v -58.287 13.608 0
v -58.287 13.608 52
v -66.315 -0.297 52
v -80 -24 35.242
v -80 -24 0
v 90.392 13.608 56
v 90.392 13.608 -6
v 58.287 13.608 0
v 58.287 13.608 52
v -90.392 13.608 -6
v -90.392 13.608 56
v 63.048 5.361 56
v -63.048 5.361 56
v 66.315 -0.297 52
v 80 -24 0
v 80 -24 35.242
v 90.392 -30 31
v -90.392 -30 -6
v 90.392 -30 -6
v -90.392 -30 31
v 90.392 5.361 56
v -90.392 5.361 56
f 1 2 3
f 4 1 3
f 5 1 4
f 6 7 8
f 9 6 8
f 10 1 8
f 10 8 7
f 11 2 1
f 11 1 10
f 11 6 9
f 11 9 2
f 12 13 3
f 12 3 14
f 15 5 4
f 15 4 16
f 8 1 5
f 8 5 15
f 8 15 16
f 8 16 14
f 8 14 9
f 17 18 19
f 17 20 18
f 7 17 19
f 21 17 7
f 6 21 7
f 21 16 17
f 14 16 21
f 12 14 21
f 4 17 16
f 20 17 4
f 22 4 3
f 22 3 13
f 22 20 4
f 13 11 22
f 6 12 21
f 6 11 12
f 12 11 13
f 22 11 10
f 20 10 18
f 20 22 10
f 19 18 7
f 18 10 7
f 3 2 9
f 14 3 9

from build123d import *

# Parameters (mm, degrees)
F1_DEPTH    = 56
F2_T1_DEPTH = 363.4104337306
F3_DEPTH    = 56
F6_DEPTH    = 6
F5_W        = 259.5228254795
F5_H        = 121.416632086
F7_DEPTH    = 25
F8_DEPTH    = 52


# Not quite as in the source:
# - a fillet or chamfer that OpenCascade refuses, or shapes differently, is made with other operations: its cross-section is extruded or revolved along the edge and cut away or added


with BuildPart() as f1:
    # F0 (on Top) → F1 (new body)
    with BuildSketch(Plane.XY):
        Polygon((80, -24), (-80, -24), (-58.2867488807, 13.6084541361), (-65.214952111, 13.6084541361), (-73.0717967697, 0), (-90.3923048454, -30), (90.3923048454, -30), (73.0717967697, 0), (65.214952111, 13.6084541361), (58.2867488807, 13.6084541361), align=None)
        Polygon((-90.3923048454, -30), (-73.0717967697, 0), (-90.3923048454, 0), align=None)
        Polygon((90.3923048454, 0), (73.0717967697, 0), (90.3923048454, -30), align=None)
        Polygon((-73.0717967697, 0), (-65.214952111, 13.6084541361), (-90.3923048454, 13.6084541361), (-90.3923048454, 0), align=None)
        Polygon((90.3923048454, 13.6084541361), (65.214952111, 13.6084541361), (73.0717967697, 0), (90.3923048454, 0), align=None)
    extrude(amount=F1_DEPTH)

    # F2: chamfer of 25 x 35.3610857633 on 1 edges, made by hand

    # F2_s2 → F2_t1 (cut)
    with BuildSketch(Plane.YZ.offset(-181.7052168653)):
        Polygon((-30, 31), (5.3610857633, 56), (-30, 56), align=None)
    extrude(amount=F2_T1_DEPTH, mode=Mode.SUBTRACT)

    # F0 (on Top) → F3 (join)
    with BuildSketch(Plane.XY):
        Polygon((-58.2867488807, 13.6084541361), (-80, -24), (80, -24), (58.2867488807, 13.6084541361), align=None)
    extrude(amount=F3_DEPTH)

    # F0 (on Top) → F6 (join)
    with BuildSketch(Plane.XY):
        Polygon((-58.2867488807, 13.6084541361), (-80, -24), (80, -24), (58.2867488807, 13.6084541361), align=None)
        Polygon((80, -24), (-80, -24), (-58.2867488807, 13.6084541361), (-65.214952111, 13.6084541361), (-73.0717967697, 0), (-90.3923048454, -30), (90.3923048454, -30), (73.0717967697, 0), (65.214952111, 13.6084541361), (58.2867488807, 13.6084541361), align=None)
        Polygon((-90.3923048454, -30), (-73.0717967697, 0), (-90.3923048454, 0), align=None)
        Polygon((-73.0717967697, 0), (-65.214952111, 13.6084541361), (-90.3923048454, 13.6084541361), (-90.3923048454, 0), align=None)
        Polygon((90.3923048454, 13.6084541361), (65.214952111, 13.6084541361), (73.0717967697, 0), (90.3923048454, 0), align=None)
        Polygon((90.3923048454, 0), (73.0717967697, 0), (90.3923048454, -30), align=None)
    extrude(amount=-F6_DEPTH)

    # F5 (on offset) → F7 (cut)
    with BuildSketch(Plane(origin=(0, -24.6105813664, 34.8102751353), x_dir=(1, 0, 0), z_dir=(0, -0.5772877121, 0.8165408119))):
        with Locations((5.841344595, -0.7894355804)):
            Rectangle(F5_W, F5_H)
    extrude(amount=F7_DEPTH, mode=Mode.SUBTRACT)

    # F0 (on Top) → F8 (cut)
    with BuildSketch(Plane.XY):
        Polygon((-58.2867488807, 13.6084541361), (-80, -24), (80, -24), (58.2867488807, 13.6084541361), align=None)
    extrude(amount=F8_DEPTH, mode=Mode.SUBTRACT)


solid = f1.part
